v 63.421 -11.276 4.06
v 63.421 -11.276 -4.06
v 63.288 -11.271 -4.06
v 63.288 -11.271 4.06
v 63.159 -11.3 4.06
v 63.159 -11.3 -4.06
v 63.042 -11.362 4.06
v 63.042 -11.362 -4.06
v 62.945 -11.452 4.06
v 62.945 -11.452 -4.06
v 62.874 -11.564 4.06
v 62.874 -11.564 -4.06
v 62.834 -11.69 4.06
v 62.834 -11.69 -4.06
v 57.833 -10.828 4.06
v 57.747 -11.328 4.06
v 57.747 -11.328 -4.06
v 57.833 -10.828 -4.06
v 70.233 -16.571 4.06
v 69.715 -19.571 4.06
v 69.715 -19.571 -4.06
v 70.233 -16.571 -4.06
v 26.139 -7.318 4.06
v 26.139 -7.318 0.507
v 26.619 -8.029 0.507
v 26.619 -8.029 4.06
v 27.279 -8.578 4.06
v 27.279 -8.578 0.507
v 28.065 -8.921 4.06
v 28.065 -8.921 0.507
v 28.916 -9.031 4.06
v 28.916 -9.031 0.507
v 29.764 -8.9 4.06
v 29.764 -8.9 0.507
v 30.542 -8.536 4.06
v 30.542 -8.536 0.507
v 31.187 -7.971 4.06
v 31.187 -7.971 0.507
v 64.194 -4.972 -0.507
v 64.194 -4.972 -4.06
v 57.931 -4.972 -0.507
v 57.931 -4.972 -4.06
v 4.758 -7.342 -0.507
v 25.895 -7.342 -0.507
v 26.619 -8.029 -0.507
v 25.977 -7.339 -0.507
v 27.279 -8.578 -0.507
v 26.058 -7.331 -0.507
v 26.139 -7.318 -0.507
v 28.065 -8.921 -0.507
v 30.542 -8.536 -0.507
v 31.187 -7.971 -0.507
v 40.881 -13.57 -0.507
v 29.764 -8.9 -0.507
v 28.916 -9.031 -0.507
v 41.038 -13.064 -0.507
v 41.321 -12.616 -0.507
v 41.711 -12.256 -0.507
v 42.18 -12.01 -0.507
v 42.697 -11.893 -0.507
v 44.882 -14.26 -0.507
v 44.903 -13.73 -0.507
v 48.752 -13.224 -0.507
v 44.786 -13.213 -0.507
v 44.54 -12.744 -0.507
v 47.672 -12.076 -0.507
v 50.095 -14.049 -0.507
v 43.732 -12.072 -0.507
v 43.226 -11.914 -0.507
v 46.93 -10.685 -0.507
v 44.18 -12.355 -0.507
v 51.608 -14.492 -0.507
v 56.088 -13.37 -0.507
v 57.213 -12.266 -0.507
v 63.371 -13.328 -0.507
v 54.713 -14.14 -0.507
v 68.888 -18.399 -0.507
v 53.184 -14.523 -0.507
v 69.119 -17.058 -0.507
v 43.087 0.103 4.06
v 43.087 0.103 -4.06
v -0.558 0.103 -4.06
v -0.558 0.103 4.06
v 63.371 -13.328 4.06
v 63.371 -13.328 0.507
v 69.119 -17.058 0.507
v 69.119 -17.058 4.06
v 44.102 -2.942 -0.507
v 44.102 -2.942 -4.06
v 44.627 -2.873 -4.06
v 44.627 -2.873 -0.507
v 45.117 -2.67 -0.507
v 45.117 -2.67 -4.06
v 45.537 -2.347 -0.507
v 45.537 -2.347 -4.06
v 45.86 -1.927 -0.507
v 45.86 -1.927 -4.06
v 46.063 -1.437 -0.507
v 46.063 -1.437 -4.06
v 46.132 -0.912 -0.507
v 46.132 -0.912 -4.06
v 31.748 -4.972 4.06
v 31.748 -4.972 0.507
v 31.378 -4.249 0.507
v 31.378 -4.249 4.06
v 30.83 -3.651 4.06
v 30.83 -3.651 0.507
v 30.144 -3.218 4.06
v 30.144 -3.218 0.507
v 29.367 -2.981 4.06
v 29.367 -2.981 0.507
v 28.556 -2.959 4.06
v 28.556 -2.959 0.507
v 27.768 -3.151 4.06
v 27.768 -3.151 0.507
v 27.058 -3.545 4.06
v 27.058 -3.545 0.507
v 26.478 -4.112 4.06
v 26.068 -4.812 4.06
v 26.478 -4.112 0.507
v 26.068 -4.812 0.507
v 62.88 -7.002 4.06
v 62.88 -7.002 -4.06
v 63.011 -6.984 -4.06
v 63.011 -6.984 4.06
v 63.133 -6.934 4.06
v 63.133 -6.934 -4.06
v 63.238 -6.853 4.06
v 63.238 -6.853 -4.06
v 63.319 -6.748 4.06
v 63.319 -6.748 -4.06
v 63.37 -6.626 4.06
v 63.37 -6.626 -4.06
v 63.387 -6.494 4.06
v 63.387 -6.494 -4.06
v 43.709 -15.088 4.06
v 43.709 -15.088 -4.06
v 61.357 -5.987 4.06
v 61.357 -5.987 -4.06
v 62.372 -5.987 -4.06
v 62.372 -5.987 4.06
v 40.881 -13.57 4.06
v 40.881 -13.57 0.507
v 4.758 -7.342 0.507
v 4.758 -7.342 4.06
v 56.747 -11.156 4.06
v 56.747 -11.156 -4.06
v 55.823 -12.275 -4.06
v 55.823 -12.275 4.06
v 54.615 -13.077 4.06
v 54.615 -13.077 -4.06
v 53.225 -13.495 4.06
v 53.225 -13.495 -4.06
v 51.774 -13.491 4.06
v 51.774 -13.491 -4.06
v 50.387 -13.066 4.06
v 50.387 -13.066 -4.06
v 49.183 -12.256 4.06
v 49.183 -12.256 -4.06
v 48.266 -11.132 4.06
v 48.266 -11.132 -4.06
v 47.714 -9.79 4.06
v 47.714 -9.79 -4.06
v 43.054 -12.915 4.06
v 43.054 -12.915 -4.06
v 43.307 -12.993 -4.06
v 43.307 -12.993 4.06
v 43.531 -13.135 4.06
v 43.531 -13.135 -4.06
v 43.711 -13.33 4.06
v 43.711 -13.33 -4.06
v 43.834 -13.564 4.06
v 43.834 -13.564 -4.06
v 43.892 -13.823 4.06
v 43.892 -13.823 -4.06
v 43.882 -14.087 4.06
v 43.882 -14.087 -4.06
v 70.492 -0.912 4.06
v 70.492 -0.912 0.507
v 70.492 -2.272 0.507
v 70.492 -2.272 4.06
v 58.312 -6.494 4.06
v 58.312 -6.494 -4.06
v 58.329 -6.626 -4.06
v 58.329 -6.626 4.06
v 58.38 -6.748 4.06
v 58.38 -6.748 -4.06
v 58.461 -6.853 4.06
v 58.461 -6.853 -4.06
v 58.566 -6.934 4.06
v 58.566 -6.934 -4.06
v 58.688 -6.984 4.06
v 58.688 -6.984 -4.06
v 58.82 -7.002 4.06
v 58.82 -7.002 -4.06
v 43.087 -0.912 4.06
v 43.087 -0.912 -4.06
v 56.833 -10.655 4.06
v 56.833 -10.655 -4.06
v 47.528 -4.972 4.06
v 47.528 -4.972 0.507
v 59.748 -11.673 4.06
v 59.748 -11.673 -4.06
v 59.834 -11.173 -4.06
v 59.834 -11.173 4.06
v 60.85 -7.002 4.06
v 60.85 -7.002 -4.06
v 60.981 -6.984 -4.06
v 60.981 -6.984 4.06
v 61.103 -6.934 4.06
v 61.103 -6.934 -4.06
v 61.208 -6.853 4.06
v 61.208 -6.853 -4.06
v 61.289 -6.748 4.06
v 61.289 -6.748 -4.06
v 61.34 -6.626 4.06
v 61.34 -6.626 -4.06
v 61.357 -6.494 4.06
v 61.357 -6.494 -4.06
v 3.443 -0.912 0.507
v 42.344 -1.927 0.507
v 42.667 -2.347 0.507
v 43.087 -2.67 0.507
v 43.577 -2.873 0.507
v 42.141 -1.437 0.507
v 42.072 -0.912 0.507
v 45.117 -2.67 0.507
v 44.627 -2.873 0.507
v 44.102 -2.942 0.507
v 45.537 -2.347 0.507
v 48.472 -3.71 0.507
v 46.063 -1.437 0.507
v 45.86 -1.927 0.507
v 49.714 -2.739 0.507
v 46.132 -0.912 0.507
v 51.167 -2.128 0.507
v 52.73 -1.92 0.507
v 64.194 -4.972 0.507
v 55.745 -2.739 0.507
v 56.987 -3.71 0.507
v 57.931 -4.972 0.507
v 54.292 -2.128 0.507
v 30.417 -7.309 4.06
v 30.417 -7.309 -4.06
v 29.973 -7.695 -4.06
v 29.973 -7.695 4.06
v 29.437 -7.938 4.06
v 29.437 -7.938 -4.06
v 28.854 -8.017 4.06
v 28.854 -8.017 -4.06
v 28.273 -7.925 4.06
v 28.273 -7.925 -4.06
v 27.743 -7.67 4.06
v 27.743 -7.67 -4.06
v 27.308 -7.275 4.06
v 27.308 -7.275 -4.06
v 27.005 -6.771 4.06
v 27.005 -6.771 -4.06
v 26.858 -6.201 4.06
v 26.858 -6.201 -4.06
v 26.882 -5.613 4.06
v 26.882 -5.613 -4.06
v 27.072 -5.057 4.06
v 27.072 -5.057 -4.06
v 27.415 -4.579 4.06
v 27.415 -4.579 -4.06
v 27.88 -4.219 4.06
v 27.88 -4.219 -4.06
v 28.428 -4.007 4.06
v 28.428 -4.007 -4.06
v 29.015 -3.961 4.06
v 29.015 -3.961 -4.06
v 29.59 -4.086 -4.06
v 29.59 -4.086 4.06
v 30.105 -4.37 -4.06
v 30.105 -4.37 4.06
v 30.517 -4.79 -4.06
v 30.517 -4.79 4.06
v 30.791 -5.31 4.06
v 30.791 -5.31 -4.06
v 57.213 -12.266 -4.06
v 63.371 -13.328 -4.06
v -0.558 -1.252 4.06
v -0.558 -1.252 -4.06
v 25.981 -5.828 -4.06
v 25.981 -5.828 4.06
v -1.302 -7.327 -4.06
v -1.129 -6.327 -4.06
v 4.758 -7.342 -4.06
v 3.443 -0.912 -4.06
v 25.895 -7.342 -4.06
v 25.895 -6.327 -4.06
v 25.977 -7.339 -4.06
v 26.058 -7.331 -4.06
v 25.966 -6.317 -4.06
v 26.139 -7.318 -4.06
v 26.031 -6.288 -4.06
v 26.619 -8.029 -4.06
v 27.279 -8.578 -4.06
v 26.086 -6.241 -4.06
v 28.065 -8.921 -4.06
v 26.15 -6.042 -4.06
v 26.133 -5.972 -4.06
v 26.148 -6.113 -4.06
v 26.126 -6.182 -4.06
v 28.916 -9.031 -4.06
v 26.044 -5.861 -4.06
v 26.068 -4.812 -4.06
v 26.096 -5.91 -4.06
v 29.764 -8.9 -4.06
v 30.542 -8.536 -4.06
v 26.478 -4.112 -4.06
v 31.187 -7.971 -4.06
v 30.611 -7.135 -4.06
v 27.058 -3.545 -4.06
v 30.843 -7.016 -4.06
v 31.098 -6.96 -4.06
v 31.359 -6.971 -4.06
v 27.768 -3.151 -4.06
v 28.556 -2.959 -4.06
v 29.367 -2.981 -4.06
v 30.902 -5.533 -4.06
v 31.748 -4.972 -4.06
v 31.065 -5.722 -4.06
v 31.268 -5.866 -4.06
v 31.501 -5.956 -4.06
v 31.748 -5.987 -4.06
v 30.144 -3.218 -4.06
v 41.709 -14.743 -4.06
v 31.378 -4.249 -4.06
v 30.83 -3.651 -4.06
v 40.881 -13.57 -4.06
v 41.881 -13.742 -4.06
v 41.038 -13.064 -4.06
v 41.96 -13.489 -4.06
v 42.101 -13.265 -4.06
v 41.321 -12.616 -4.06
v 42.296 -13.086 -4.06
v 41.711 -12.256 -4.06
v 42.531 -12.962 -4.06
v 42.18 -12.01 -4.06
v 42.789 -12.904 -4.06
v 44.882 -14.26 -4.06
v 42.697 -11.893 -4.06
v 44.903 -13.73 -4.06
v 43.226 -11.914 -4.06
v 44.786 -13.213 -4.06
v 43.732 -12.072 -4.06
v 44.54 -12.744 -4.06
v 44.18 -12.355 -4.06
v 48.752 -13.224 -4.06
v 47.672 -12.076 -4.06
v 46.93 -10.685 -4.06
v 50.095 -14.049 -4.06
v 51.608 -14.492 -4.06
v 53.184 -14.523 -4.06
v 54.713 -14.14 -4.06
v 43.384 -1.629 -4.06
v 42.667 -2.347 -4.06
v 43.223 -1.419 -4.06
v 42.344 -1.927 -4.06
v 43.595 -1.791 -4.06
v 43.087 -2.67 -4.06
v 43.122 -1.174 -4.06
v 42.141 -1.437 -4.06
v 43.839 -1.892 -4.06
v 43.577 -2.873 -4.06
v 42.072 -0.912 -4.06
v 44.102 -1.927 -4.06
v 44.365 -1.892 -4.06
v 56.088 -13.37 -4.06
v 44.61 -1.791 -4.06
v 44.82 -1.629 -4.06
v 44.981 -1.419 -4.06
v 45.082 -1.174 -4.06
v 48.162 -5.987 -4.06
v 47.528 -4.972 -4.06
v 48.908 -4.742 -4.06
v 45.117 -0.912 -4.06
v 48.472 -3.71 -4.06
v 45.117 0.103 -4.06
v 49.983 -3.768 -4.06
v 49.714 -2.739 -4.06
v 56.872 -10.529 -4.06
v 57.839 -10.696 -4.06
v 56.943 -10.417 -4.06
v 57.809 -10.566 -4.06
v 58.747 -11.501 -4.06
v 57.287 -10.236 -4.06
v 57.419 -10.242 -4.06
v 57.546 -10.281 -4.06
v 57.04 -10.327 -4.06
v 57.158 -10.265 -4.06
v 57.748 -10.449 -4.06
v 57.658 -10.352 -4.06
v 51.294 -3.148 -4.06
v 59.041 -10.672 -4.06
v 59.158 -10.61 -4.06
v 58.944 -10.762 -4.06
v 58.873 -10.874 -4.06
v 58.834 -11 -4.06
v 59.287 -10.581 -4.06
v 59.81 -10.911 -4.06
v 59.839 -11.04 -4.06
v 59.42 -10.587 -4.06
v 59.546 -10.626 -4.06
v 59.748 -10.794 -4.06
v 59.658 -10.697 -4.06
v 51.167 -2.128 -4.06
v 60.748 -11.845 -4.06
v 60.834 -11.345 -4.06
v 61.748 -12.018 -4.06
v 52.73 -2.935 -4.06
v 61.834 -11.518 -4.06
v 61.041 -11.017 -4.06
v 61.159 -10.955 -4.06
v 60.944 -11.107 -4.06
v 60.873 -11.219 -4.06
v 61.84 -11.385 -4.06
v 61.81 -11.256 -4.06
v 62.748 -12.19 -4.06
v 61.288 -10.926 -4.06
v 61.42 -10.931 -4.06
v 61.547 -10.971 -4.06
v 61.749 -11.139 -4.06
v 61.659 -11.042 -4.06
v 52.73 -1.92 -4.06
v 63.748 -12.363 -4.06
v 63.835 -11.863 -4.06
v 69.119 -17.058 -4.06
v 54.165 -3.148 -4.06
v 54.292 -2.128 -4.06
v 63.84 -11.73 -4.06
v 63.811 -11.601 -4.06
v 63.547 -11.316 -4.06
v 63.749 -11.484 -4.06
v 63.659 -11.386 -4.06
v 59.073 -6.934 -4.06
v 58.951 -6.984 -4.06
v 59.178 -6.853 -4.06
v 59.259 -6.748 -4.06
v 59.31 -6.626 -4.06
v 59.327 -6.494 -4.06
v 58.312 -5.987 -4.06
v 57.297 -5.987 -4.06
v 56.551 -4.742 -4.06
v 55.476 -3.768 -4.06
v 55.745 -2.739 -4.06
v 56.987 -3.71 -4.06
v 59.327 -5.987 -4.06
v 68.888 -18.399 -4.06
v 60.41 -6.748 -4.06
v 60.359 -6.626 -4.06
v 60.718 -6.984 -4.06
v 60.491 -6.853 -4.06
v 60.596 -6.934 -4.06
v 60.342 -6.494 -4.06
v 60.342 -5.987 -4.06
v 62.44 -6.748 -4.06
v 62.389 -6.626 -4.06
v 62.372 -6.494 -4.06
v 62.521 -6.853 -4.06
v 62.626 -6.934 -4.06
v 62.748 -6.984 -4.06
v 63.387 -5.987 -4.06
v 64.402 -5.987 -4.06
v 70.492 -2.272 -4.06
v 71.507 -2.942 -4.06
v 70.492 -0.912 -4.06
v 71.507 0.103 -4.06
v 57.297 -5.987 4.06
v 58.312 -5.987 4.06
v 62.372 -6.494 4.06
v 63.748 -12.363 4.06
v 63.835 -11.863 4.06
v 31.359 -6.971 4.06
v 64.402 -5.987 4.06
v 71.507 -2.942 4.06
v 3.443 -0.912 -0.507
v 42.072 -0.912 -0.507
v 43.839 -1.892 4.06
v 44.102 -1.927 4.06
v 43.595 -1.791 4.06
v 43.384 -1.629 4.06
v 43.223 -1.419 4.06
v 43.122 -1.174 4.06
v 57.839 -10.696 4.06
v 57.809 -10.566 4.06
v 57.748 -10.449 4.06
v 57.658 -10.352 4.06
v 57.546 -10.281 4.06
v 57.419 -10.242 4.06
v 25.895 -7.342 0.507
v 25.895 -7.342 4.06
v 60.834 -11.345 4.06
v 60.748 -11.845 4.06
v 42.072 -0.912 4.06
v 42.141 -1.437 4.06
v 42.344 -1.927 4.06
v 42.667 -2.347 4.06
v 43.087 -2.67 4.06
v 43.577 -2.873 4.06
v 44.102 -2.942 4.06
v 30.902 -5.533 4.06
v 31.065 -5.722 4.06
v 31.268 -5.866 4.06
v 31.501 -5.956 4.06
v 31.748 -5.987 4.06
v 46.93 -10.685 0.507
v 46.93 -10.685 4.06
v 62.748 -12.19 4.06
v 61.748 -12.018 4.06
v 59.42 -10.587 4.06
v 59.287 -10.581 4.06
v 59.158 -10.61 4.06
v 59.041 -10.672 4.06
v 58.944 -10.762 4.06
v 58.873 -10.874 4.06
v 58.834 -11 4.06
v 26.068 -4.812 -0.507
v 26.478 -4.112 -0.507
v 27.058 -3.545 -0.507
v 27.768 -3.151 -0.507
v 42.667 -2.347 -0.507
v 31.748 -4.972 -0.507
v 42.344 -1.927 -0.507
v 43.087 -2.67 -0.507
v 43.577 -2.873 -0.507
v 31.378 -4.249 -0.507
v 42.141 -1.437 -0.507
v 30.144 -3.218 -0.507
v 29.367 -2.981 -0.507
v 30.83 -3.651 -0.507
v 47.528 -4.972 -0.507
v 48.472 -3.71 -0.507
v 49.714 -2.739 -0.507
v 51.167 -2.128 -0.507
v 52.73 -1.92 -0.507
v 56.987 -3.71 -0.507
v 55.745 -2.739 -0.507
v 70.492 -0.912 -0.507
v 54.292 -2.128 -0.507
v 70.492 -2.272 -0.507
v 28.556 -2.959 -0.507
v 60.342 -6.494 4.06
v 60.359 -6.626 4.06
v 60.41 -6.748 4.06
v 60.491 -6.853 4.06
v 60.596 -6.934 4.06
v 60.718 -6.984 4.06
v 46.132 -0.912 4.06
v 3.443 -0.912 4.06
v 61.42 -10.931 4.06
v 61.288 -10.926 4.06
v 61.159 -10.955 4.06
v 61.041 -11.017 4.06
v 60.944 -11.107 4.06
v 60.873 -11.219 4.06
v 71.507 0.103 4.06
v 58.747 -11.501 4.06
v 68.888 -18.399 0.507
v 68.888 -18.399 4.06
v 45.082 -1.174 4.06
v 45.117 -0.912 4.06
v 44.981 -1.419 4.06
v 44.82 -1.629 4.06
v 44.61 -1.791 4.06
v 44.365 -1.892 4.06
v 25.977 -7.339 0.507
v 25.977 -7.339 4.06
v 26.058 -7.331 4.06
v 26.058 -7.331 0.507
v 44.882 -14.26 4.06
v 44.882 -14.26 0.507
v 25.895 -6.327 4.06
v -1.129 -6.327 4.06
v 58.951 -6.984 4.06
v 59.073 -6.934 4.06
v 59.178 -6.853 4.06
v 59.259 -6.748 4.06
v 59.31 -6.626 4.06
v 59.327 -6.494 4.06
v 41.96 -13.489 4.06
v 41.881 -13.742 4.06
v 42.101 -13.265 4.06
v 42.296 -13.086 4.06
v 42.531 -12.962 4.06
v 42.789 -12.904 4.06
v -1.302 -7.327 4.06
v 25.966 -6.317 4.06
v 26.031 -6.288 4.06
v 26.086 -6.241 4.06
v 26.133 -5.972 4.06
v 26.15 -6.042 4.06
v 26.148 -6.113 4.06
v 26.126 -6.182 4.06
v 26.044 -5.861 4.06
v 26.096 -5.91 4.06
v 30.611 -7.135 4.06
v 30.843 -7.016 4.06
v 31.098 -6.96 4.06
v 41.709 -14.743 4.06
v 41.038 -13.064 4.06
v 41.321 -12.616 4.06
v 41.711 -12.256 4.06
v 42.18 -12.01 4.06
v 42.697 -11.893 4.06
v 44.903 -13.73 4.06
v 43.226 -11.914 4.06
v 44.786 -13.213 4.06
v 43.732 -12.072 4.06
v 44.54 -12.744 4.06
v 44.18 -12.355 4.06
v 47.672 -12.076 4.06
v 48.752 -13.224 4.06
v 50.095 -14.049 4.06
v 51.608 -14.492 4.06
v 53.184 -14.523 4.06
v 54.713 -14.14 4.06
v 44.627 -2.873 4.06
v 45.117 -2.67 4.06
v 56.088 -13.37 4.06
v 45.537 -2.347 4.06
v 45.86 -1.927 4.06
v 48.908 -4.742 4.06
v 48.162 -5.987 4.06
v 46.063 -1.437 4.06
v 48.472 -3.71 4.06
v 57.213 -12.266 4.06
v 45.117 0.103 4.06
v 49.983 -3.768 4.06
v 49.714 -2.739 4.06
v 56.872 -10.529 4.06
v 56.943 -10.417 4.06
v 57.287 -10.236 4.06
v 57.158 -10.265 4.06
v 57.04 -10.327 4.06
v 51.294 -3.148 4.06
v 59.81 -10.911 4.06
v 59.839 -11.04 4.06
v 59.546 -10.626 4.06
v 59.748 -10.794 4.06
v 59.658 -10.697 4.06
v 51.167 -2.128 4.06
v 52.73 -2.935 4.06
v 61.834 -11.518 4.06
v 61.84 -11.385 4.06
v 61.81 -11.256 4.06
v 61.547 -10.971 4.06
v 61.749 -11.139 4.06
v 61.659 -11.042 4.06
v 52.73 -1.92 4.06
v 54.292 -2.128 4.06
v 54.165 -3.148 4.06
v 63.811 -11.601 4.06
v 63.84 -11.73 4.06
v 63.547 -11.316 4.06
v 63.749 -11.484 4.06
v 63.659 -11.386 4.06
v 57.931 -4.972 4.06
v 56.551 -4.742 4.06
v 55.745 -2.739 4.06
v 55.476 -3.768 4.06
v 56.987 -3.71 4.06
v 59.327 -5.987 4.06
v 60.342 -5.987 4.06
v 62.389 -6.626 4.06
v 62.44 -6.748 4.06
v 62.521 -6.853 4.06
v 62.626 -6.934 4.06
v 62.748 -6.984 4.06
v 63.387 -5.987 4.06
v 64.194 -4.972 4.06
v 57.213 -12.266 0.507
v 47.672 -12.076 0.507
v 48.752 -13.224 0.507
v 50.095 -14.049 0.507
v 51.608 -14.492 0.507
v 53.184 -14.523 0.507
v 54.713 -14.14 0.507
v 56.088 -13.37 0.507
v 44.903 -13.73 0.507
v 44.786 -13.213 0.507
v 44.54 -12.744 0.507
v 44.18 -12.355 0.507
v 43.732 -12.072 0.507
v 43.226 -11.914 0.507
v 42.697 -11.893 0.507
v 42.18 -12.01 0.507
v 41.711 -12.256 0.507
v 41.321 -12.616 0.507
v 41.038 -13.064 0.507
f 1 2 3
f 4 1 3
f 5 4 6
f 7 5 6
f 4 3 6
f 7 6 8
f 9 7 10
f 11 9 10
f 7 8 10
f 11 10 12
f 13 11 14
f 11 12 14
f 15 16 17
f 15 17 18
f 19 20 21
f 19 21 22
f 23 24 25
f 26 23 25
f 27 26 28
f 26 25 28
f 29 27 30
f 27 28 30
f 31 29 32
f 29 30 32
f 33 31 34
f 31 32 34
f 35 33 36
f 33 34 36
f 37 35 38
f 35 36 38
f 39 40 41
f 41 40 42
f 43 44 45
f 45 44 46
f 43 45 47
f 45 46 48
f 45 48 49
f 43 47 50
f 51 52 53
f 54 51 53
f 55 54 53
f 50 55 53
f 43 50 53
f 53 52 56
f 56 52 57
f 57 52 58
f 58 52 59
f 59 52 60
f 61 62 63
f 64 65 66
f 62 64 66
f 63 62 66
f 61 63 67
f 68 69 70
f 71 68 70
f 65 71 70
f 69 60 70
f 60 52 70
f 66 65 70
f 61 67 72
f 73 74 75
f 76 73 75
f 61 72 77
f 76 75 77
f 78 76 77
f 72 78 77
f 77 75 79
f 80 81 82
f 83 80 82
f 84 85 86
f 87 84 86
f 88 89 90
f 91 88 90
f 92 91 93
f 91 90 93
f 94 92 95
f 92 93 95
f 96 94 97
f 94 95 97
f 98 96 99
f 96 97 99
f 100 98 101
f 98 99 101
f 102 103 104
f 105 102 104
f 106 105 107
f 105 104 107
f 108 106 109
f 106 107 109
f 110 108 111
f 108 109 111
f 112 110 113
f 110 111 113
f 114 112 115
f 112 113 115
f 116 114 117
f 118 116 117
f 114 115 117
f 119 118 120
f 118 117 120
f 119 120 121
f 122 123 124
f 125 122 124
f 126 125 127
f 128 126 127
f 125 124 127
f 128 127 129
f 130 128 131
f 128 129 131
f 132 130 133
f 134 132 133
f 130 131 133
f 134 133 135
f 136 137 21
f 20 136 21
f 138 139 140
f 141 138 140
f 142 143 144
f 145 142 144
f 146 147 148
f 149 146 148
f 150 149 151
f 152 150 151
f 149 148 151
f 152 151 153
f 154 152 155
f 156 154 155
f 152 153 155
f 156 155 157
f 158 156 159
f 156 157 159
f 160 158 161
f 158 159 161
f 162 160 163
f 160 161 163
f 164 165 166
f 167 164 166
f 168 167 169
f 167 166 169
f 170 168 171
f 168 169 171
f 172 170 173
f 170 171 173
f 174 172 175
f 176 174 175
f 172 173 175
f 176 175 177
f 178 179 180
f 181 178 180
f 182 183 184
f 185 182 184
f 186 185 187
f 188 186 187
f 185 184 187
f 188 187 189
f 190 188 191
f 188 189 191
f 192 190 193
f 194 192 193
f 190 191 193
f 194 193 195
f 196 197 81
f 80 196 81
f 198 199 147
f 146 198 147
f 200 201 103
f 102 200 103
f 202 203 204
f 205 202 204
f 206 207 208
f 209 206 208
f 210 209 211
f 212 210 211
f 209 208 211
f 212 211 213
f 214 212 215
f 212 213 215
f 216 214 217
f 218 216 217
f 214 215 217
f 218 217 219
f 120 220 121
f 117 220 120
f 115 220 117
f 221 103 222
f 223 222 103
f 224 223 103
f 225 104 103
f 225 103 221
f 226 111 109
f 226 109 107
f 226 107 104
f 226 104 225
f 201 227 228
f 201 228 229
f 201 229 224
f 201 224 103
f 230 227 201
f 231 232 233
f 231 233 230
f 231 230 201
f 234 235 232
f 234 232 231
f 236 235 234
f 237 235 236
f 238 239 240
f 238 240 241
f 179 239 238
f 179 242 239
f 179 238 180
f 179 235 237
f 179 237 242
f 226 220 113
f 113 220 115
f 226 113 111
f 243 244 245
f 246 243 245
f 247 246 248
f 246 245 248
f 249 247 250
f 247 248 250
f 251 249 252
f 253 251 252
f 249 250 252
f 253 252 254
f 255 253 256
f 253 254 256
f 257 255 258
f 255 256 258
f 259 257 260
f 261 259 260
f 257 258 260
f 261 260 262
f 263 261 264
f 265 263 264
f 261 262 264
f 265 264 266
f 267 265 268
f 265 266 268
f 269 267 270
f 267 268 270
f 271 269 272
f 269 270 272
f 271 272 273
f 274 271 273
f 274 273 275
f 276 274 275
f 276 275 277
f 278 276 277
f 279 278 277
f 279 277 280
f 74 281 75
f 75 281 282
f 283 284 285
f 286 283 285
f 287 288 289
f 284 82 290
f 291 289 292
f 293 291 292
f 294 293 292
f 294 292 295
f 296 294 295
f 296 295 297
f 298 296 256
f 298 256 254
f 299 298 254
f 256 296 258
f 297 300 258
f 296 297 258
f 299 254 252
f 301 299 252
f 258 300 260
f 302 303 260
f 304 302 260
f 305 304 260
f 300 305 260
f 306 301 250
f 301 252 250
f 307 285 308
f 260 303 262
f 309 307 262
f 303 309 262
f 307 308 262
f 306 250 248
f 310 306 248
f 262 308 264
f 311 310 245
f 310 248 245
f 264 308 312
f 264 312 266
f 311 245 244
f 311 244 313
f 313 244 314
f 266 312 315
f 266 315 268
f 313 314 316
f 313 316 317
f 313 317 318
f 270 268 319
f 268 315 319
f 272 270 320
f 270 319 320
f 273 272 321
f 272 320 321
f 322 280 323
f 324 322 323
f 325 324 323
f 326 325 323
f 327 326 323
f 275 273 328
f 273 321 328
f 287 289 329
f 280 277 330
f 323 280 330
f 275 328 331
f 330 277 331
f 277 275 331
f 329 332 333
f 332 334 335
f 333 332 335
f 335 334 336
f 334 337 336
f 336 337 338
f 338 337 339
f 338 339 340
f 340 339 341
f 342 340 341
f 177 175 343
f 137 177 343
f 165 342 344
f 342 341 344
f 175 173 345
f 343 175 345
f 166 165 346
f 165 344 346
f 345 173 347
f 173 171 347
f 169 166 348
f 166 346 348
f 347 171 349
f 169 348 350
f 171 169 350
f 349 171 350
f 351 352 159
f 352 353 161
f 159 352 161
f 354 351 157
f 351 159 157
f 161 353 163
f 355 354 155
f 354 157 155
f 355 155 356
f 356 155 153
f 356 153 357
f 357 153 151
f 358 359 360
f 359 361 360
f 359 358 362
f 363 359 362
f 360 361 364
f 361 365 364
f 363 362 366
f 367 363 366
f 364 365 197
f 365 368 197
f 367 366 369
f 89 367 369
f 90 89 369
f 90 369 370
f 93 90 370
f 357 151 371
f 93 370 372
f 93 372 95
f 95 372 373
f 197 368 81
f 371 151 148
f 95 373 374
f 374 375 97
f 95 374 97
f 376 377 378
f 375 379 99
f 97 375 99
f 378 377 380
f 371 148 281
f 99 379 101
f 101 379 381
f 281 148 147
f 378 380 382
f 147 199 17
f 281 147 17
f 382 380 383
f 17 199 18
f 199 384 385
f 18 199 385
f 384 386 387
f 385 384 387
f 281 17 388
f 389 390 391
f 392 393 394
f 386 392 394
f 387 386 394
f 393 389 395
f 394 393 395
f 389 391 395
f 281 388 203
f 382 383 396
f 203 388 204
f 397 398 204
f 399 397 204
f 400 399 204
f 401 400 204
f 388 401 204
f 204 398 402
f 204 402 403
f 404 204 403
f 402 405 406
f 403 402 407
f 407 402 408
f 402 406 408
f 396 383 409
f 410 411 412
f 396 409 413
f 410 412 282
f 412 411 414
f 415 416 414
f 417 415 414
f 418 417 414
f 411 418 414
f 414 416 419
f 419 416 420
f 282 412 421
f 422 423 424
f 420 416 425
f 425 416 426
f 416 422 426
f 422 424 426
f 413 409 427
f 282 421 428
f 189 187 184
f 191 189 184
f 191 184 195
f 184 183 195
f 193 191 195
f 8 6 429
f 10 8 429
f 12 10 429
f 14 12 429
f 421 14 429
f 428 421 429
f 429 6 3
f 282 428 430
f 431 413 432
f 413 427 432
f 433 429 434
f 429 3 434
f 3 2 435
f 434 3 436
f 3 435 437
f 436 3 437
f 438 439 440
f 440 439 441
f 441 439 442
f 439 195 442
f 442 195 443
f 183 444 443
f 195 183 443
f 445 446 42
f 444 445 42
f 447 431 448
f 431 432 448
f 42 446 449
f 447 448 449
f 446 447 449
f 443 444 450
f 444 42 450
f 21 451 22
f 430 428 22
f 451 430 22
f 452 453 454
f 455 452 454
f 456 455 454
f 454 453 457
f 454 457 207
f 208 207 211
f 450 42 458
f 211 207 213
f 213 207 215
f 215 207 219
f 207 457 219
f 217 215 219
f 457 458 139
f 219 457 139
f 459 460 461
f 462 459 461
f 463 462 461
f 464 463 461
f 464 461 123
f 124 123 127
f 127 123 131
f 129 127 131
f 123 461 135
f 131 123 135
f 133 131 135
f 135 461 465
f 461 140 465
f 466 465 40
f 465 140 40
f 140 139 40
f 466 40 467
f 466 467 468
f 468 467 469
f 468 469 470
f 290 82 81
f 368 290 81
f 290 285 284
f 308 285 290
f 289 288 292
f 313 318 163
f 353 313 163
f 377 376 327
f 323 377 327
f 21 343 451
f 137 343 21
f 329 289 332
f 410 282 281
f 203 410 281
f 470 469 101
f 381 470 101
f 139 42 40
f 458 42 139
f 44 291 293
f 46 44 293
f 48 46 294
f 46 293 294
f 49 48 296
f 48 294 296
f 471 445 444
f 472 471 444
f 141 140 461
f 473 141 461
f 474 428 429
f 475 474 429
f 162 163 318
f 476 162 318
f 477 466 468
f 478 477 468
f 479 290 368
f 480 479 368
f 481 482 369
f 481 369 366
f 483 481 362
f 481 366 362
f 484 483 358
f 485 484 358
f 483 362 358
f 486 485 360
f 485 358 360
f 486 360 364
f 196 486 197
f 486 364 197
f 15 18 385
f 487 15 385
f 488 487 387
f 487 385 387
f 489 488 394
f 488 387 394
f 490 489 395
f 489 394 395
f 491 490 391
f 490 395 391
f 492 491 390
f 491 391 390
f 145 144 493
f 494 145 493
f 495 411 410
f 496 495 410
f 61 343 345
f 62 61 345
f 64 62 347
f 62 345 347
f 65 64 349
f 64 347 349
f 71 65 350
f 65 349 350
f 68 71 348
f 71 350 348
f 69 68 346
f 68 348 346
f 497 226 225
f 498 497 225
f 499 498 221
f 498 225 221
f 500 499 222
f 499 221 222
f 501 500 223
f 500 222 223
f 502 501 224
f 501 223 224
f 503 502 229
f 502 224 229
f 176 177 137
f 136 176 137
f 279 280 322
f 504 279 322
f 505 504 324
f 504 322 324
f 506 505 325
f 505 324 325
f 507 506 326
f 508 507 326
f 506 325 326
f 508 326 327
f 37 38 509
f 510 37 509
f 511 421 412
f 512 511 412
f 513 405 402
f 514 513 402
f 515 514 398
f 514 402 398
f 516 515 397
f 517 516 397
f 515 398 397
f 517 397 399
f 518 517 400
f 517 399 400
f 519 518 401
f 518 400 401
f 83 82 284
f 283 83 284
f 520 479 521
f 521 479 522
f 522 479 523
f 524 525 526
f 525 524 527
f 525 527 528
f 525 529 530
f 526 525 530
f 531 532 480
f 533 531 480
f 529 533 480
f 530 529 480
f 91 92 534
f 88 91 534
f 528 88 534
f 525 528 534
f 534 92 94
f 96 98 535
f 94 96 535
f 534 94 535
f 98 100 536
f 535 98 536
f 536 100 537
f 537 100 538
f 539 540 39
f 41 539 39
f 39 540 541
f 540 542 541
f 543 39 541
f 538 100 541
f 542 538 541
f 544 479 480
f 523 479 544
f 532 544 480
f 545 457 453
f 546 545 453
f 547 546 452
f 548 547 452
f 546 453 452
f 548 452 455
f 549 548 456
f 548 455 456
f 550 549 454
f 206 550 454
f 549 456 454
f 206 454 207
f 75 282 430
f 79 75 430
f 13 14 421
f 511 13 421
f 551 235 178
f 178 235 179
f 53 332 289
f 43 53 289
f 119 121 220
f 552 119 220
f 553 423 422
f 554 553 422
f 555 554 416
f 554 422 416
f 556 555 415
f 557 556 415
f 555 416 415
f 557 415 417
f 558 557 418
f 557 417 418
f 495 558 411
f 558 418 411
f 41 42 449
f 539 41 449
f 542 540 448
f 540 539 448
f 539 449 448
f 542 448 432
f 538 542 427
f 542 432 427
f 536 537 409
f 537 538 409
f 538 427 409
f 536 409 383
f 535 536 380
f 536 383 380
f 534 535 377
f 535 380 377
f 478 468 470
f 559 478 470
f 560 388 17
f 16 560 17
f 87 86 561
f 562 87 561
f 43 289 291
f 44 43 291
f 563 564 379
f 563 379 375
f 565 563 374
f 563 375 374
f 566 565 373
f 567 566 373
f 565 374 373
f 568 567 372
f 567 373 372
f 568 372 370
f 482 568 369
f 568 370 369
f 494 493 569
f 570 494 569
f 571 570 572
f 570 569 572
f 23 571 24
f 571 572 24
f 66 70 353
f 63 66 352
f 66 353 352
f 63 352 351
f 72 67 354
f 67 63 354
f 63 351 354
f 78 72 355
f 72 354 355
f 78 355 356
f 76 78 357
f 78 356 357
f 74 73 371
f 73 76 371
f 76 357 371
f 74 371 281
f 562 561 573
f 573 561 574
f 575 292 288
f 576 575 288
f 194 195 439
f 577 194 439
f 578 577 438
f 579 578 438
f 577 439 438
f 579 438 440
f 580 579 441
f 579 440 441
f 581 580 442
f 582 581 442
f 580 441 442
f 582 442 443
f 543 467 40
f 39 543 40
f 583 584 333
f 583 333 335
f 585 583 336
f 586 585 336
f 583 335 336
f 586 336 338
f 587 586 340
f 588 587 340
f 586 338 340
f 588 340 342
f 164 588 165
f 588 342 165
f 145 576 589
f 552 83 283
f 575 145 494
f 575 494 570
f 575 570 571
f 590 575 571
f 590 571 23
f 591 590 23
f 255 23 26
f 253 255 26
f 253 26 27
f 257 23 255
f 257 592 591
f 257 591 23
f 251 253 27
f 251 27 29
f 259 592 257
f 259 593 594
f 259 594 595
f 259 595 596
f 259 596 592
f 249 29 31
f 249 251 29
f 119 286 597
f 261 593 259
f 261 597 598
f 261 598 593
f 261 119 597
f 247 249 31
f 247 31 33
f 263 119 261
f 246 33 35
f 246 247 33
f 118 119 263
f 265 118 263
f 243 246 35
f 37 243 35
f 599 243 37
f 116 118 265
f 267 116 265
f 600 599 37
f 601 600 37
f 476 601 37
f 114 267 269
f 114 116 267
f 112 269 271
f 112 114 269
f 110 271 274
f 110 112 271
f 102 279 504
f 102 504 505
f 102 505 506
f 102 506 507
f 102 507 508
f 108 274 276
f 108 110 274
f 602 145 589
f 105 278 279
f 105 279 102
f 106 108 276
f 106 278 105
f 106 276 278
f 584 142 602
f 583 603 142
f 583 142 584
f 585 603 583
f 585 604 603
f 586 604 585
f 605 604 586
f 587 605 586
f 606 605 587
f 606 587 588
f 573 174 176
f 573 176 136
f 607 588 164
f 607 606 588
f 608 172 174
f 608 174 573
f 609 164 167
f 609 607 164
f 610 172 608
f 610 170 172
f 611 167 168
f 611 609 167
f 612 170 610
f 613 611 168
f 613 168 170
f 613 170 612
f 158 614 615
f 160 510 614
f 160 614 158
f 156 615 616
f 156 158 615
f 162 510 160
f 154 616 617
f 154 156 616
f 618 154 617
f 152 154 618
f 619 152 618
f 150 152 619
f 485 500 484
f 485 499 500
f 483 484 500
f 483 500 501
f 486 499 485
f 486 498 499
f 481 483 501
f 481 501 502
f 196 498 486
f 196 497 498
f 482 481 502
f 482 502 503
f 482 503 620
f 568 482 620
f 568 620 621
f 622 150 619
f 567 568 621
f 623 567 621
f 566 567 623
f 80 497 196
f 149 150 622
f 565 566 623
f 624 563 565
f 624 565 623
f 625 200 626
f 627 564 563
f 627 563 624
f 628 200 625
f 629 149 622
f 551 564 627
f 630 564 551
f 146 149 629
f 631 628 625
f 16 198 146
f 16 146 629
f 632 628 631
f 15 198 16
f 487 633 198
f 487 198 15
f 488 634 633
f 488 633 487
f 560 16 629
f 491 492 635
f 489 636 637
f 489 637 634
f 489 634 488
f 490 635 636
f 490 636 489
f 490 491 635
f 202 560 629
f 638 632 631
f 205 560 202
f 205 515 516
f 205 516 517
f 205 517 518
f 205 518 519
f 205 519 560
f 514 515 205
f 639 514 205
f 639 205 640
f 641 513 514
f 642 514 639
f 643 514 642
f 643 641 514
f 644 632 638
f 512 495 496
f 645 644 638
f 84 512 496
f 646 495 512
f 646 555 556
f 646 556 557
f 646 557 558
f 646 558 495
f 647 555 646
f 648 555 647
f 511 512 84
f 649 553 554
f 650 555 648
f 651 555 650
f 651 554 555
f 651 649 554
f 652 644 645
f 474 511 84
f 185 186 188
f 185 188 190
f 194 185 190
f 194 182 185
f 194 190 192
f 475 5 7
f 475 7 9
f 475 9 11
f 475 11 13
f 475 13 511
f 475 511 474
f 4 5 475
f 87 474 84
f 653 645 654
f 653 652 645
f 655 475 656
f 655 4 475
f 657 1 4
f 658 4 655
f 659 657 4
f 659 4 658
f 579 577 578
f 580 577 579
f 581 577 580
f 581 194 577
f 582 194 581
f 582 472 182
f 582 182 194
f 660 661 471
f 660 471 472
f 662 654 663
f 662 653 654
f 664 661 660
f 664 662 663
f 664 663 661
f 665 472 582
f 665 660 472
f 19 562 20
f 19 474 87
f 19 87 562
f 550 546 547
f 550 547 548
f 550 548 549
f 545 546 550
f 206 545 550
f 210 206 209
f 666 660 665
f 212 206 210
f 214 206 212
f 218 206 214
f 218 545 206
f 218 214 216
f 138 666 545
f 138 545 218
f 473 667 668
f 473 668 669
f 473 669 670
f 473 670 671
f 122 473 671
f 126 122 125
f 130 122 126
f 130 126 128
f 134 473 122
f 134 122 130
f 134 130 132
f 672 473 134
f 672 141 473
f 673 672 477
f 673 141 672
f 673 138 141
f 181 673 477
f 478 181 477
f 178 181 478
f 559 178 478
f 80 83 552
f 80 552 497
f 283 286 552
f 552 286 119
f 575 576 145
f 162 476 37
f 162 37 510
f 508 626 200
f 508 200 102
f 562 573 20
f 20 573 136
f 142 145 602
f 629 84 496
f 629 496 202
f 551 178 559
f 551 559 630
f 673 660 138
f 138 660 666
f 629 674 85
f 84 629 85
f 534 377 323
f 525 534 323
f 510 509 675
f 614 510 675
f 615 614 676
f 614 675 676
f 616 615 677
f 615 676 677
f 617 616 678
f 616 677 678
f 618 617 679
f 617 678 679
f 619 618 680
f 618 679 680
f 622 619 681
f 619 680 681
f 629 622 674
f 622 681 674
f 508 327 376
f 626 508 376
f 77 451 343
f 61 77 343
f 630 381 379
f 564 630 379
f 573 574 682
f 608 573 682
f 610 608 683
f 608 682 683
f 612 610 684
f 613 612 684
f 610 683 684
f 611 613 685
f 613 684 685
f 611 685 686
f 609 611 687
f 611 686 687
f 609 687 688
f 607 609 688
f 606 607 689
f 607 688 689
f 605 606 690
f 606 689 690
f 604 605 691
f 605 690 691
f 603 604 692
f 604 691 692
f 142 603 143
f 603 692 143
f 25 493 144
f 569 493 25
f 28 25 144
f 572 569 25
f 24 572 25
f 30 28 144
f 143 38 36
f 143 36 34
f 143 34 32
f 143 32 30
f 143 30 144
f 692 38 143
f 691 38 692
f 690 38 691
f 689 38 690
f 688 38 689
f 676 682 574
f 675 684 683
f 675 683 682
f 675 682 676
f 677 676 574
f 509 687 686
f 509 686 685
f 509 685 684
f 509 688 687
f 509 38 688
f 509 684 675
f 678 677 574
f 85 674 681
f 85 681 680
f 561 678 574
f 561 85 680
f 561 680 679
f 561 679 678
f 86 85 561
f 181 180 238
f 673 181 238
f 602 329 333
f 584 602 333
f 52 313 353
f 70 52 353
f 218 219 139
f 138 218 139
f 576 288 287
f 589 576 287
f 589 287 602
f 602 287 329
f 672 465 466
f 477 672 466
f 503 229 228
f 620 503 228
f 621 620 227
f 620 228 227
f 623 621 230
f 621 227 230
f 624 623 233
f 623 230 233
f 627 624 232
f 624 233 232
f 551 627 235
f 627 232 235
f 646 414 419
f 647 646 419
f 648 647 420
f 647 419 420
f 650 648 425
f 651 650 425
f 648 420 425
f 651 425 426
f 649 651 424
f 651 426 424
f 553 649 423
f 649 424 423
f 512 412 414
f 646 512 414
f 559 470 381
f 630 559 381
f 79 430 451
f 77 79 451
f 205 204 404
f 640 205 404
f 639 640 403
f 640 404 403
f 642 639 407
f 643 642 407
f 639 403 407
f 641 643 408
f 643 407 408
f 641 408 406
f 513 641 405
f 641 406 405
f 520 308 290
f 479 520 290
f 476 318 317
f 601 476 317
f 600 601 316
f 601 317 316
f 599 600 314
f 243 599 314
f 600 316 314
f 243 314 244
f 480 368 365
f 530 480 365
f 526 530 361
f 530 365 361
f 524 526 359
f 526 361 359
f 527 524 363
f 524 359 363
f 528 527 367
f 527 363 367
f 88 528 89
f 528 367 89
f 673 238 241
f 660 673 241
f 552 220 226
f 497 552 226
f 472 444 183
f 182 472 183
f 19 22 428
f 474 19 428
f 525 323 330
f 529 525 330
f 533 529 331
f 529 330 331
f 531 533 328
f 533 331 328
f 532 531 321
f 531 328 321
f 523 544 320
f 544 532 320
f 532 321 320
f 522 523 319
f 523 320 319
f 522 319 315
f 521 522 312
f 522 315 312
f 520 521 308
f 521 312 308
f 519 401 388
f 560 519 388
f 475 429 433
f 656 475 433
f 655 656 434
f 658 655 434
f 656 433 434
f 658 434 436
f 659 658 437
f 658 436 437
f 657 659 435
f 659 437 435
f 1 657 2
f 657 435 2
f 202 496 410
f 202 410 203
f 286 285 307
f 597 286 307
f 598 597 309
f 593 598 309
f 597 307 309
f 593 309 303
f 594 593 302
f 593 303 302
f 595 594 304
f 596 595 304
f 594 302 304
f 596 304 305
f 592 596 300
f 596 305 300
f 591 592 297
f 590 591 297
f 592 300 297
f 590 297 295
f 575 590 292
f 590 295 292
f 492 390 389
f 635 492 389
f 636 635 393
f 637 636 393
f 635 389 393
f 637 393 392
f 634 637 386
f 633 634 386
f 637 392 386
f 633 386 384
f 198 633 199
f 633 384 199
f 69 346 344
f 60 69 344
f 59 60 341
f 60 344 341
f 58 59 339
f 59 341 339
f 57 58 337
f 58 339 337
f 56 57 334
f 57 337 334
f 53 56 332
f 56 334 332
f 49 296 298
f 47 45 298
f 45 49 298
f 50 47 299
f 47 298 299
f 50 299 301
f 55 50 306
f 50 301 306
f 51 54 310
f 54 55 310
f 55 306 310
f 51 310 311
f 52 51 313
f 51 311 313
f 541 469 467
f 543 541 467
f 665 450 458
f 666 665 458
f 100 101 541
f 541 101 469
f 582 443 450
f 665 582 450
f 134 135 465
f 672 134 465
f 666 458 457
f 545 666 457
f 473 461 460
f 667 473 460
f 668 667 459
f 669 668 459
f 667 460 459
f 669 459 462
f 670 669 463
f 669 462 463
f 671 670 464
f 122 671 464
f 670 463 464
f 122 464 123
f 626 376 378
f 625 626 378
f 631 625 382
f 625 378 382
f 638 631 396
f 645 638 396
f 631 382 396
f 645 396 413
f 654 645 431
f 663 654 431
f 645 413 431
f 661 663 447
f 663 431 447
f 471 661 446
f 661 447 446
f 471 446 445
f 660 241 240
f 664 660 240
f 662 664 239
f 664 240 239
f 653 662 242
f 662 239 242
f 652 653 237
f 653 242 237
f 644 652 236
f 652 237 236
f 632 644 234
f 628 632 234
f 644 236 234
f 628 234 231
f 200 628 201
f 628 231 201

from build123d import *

# Parameters (mm, degrees)
BRUTO_GRAMPO_1_START   = -4
BRUTO_GRAMPO_1_DEPTH   = 8
BRUTO_GRAMPO_1_START_2 = -0.5
BRUTO_GRAMPO_1_2_DEPTH = 1
ESCALA1_SCALE          = 1.015


# Read off the part's stored shape, not the designer's step: Bruto-Grampo-1
with BuildPart() as part:
    # Bruto-Grampo-1 outline → Bruto-Grampo-1 (new body)
    with BuildSketch(Plane.XY.offset(BRUTO_GRAMPO_1_START)):
        with BuildLine():
            Line((63, -6), (64, -6))
            Line((64, -6), (71, -3))
            Line((71, -3), (71, 0))
            Line((71, 0), (45, 0))
            Line((45, 0), (45, -1))
            ThreePointArc((45, -1), (44.707106781, -1.707106781), (44, -2))
            ThreePointArc((44, -2), (43.292893219, -1.707106781), (43, -1))
            Line((43, -1), (43, 0))
            Line((43, 0), (0, 0))
            Line((0, 0), (0, -1.335144068))
            Line((0, -1.335144068), (26.146588044, -5.84317649))
            ThreePointArc((26.146588044, -5.84317649), (26.311379183, -6.124884785), (26.061766048, -6.335144068))
            Line((26.061766048, -6.335144068), (-0.562908784, -6.335144068))
            Line((-0.562908784, -6.335144068), (-0.732815701, -7.320604184))
            Line((-0.732815701, -7.320604184), (41.641969276, -14.626601592))
            Line((41.641969276, -14.626601592), (41.811876193, -13.641141477))
            ThreePointArc((41.811876193, -13.641141477), (42.220653111, -12.99408053), (42.967243225, -12.825588277))
            ThreePointArc((42.967243225, -12.825588277), (43.614304172, -13.234365196), (43.782796424, -13.98095531))
            Line((43.782796424, -13.98095531), (43.612889508, -14.966415425))
            Line((43.612889508, -14.966415425), (69.234852518, -19.383995254))
            Line((69.234852518, -19.383995254), (69.744573267, -16.427614907))
            Line((69.744573267, -16.427614907), (63.356073202, -12.281886143))
            Line((63.356073202, -12.281886143), (63.44102666, -11.789156085))
            ThreePointArc((63.44102666, -11.789156085), (63.356780534, -11.415861028), (63.03325006, -11.211472569))
            ThreePointArc((63.03325006, -11.211472569), (62.659955003, -11.295718696), (62.455566544, -11.619249169))
            Line((62.455566544, -11.619249169), (62.370613086, -12.111979227))
            Line((62.370613086, -12.111979227), (61.38515297, -11.94207231))
            Line((61.38515297, -11.94207231), (61.470106428, -11.449342252))
            ThreePointArc((61.470106428, -11.449342252), (61.385860302, -11.076047195), (61.062329829, -10.871658736))
            ThreePointArc((61.062329829, -10.871658736), (60.689034772, -10.955904863), (60.484646313, -11.279435336))
            Line((60.484646313, -11.279435336), (60.399692854, -11.772165394))
            Line((60.399692854, -11.772165394), (59.414232739, -11.602258477))
            Line((59.414232739, -11.602258477), (59.499186197, -11.109528419))
            ThreePointArc((59.499186197, -11.109528419), (59.414940071, -10.736233362), (59.091409597, -10.531844903))
            ThreePointArc((59.091409597, -10.531844903), (58.71811454, -10.61609103), (58.513726081, -10.939621503))
            Line((58.513726081, -10.939621503), (58.428772623, -11.432351561))
            Line((58.428772623, -11.432351561), (57.443312507, -11.262444644))
            Line((57.443312507, -11.262444644), (57.528265965, -10.769714587))
            ThreePointArc((57.528265965, -10.769714587), (57.444019839, -10.39641953), (57.120489366, -10.19203107))
            ThreePointArc((57.120489366, -10.19203107), (56.747194309, -10.276277197), (56.54280585, -10.59980767))
            Line((56.54280585, -10.59980767), (56.457852391, -11.092537728))
            ThreePointArc((56.457852391, -11.092537728), (51.559018801, -13.393037449), (47.558931741, -9.747468492))
            Line((47.558931741, -9.747468492), (31.445619908, -6.969311252))
            ThreePointArc((31.445619908, -6.969311252), (30.937336598, -7.013760518), (30.517142023, -7.303180937))
            ThreePointArc((30.517142023, -7.303180937), (27.034098374, -5.632261947), (30.885618205, -5.333333319))
            ThreePointArc((30.885618205, -5.333333319), (31.251076976, -5.816496576), (31.828427251, -5.999999999))
            Line((31.828427251, -5.999999999), (48, -5.999999999))
            ThreePointArc((48, -5.999999999), (52.5, -2.993196129), (57, -6))
            Line((57, -6), (58, -6))
            Line((58, -6), (58, -6.5))
            ThreePointArc((58, -6.5), (58.146446609, -6.853553391), (58.5, -7))
            ThreePointArc((58.5, -7), (58.853553391, -6.853553391), (59, -6.5))
            Line((59, -6.5), (59, -6))
            Line((59, -6), (60, -6))
            Line((60, -6), (60, -6.5))
            ThreePointArc((60, -6.5), (60.146446609, -6.853553391), (60.5, -7))
            ThreePointArc((60.5, -7), (60.853553391, -6.853553391), (61, -6.5))
            Line((61, -6.5), (61, -6))
            Line((61, -6), (62, -6))
            Line((62, -6), (62, -6.5))
            ThreePointArc((62, -6.5), (62.146446609, -6.853553391), (62.5, -7))
            ThreePointArc((62.5, -7), (62.853553391, -6.853553391), (63, -6.5))
            Line((63, -6.5), (63, -6))
        make_face()
        with BuildLine():
            Line((68.419299318, -18.228628222), (44.76825654, -14.150862226))
            ThreePointArc((44.76825654, -14.150862226), (44.431272035, -12.657681998), (43.137150142, -11.840128162))
            ThreePointArc((43.137150142, -11.840128162), (41.643969914, -12.177112667), (40.826416077, -13.47123456))
            Line((40.826416077, -13.47123456), (5.237091217, -7.335144068))
            Line((5.237091217, -7.335144068), (26.061766048, -7.335144068))
            ThreePointArc((26.061766048, -7.335144068), (26.18246919, -7.329318154), (26.302050161, -7.311894575))
            ThreePointArc((26.302050161, -7.311894575), (28.615430589, -8.975249078), (31.27571299, -7.954771367))
            Line((31.27571299, -7.954771367), (46.78652147, -10.629048718))
            ThreePointArc((46.78652147, -10.629048718), (51.394904099, -14.37957122), (56.91703012, -12.186460714))
            Line((56.91703012, -12.186460714), (62.983893007, -13.232471556))
            Line((62.983893007, -13.232471556), (68.647077183, -16.907516604))
            Line((68.647077183, -16.907516604), (68.419299318, -18.228628222))
        make_face(mode=Mode.SUBTRACT)
        with BuildLine():
            ThreePointArc((31.828427251, -4.999999999), (29.084046667, -3.001177418), (26.232021768, -4.84315203))
            Line((26.232021768, -4.84315203), (3.941739992, -1))
            Line((3.941739992, -1), (42, -1))
            ThreePointArc((42, -1), (42.585786438, -2.414213562), (44, -3))
            ThreePointArc((44, -3), (45.414213562, -2.414213562), (46, -1))
            Line((46, -1), (70, -1))
            Line((70, -1), (70, -2.340603842))
            Line((70, -2.340603842), (63.794742298, -5))
            Line((63.794742298, -5), (57.624803191, -5))
            ThreePointArc((57.624803191, -5), (52.500000001, -1.993196129), (47.37519681, -4.999999999))
            Line((47.37519681, -4.999999999), (31.828427251, -4.999999999))
        make_face(mode=Mode.SUBTRACT)
    extrude(amount=BRUTO_GRAMPO_1_DEPTH)

    # Bruto-Grampo-1 2 outline → Bruto-Grampo-1 2 (add)
    with BuildSketch(Plane.XY.offset(BRUTO_GRAMPO_1_START_2)):
        with BuildLine():
            ThreePointArc((43.137150142, -11.840128162), (44.431272035, -12.657681998), (44.76825654, -14.150862226))
            Line((44.76825654, -14.150862226), (68.419299318, -18.228628222))
            Line((68.419299318, -18.228628222), (68.647077183, -16.907516604))
            Line((68.647077183, -16.907516604), (62.983893007, -13.232471556))
            Line((62.983893007, -13.232471556), (56.91703012, -12.186460714))
            ThreePointArc((56.91703012, -12.186460714), (51.394904099, -14.37957122), (46.78652147, -10.629048718))
            Line((46.78652147, -10.629048718), (31.27571299, -7.954771367))
            ThreePointArc((31.27571299, -7.954771367), (28.615430589, -8.975249078), (26.302050161, -7.311894575))
            ThreePointArc((26.302050161, -7.311894575), (26.18246919, -7.329318154), (26.061766048, -7.335144068))
            Line((26.061766048, -7.335144068), (5.237091217, -7.335144068))
            Line((5.237091217, -7.335144068), (40.826416077, -13.47123456))
            ThreePointArc((40.826416077, -13.47123456), (41.643969914, -12.177112667), (43.137150142, -11.840128162))
        make_face()
        with BuildLine():
            Line((3.941739992, -1), (26.232021768, -4.84315203))
            ThreePointArc((26.232021768, -4.84315203), (29.084046667, -3.001177418), (31.828427251, -4.999999999))
            Line((31.828427251, -4.999999999), (47.37519681, -4.999999999))
            ThreePointArc((47.37519681, -4.999999999), (52.500000001, -1.993196129), (57.624803191, -5))
            Line((57.624803191, -5), (63.794742298, -5))
            Line((63.794742298, -5), (70, -2.340603842))
            Line((70, -2.340603842), (70, -1))
            Line((70, -1), (46, -1))
            ThreePointArc((46, -1), (45.414213562, -2.414213562), (44, -3))
            ThreePointArc((44, -3), (42.585786438, -2.414213562), (42, -1))
            Line((42, -1), (3.941739992, -1))
        make_face()
    extrude(amount=BRUTO_GRAMPO_1_2_DEPTH)


with BuildPart() as part_1:
    # Escala1: scaled about (37.195426372, -6.887443952, 0)
    add(part.part.scale(ESCALA1_SCALE).moved(Location((-0.557931396, 0.103311659, 0))))


solid = part_1.part
